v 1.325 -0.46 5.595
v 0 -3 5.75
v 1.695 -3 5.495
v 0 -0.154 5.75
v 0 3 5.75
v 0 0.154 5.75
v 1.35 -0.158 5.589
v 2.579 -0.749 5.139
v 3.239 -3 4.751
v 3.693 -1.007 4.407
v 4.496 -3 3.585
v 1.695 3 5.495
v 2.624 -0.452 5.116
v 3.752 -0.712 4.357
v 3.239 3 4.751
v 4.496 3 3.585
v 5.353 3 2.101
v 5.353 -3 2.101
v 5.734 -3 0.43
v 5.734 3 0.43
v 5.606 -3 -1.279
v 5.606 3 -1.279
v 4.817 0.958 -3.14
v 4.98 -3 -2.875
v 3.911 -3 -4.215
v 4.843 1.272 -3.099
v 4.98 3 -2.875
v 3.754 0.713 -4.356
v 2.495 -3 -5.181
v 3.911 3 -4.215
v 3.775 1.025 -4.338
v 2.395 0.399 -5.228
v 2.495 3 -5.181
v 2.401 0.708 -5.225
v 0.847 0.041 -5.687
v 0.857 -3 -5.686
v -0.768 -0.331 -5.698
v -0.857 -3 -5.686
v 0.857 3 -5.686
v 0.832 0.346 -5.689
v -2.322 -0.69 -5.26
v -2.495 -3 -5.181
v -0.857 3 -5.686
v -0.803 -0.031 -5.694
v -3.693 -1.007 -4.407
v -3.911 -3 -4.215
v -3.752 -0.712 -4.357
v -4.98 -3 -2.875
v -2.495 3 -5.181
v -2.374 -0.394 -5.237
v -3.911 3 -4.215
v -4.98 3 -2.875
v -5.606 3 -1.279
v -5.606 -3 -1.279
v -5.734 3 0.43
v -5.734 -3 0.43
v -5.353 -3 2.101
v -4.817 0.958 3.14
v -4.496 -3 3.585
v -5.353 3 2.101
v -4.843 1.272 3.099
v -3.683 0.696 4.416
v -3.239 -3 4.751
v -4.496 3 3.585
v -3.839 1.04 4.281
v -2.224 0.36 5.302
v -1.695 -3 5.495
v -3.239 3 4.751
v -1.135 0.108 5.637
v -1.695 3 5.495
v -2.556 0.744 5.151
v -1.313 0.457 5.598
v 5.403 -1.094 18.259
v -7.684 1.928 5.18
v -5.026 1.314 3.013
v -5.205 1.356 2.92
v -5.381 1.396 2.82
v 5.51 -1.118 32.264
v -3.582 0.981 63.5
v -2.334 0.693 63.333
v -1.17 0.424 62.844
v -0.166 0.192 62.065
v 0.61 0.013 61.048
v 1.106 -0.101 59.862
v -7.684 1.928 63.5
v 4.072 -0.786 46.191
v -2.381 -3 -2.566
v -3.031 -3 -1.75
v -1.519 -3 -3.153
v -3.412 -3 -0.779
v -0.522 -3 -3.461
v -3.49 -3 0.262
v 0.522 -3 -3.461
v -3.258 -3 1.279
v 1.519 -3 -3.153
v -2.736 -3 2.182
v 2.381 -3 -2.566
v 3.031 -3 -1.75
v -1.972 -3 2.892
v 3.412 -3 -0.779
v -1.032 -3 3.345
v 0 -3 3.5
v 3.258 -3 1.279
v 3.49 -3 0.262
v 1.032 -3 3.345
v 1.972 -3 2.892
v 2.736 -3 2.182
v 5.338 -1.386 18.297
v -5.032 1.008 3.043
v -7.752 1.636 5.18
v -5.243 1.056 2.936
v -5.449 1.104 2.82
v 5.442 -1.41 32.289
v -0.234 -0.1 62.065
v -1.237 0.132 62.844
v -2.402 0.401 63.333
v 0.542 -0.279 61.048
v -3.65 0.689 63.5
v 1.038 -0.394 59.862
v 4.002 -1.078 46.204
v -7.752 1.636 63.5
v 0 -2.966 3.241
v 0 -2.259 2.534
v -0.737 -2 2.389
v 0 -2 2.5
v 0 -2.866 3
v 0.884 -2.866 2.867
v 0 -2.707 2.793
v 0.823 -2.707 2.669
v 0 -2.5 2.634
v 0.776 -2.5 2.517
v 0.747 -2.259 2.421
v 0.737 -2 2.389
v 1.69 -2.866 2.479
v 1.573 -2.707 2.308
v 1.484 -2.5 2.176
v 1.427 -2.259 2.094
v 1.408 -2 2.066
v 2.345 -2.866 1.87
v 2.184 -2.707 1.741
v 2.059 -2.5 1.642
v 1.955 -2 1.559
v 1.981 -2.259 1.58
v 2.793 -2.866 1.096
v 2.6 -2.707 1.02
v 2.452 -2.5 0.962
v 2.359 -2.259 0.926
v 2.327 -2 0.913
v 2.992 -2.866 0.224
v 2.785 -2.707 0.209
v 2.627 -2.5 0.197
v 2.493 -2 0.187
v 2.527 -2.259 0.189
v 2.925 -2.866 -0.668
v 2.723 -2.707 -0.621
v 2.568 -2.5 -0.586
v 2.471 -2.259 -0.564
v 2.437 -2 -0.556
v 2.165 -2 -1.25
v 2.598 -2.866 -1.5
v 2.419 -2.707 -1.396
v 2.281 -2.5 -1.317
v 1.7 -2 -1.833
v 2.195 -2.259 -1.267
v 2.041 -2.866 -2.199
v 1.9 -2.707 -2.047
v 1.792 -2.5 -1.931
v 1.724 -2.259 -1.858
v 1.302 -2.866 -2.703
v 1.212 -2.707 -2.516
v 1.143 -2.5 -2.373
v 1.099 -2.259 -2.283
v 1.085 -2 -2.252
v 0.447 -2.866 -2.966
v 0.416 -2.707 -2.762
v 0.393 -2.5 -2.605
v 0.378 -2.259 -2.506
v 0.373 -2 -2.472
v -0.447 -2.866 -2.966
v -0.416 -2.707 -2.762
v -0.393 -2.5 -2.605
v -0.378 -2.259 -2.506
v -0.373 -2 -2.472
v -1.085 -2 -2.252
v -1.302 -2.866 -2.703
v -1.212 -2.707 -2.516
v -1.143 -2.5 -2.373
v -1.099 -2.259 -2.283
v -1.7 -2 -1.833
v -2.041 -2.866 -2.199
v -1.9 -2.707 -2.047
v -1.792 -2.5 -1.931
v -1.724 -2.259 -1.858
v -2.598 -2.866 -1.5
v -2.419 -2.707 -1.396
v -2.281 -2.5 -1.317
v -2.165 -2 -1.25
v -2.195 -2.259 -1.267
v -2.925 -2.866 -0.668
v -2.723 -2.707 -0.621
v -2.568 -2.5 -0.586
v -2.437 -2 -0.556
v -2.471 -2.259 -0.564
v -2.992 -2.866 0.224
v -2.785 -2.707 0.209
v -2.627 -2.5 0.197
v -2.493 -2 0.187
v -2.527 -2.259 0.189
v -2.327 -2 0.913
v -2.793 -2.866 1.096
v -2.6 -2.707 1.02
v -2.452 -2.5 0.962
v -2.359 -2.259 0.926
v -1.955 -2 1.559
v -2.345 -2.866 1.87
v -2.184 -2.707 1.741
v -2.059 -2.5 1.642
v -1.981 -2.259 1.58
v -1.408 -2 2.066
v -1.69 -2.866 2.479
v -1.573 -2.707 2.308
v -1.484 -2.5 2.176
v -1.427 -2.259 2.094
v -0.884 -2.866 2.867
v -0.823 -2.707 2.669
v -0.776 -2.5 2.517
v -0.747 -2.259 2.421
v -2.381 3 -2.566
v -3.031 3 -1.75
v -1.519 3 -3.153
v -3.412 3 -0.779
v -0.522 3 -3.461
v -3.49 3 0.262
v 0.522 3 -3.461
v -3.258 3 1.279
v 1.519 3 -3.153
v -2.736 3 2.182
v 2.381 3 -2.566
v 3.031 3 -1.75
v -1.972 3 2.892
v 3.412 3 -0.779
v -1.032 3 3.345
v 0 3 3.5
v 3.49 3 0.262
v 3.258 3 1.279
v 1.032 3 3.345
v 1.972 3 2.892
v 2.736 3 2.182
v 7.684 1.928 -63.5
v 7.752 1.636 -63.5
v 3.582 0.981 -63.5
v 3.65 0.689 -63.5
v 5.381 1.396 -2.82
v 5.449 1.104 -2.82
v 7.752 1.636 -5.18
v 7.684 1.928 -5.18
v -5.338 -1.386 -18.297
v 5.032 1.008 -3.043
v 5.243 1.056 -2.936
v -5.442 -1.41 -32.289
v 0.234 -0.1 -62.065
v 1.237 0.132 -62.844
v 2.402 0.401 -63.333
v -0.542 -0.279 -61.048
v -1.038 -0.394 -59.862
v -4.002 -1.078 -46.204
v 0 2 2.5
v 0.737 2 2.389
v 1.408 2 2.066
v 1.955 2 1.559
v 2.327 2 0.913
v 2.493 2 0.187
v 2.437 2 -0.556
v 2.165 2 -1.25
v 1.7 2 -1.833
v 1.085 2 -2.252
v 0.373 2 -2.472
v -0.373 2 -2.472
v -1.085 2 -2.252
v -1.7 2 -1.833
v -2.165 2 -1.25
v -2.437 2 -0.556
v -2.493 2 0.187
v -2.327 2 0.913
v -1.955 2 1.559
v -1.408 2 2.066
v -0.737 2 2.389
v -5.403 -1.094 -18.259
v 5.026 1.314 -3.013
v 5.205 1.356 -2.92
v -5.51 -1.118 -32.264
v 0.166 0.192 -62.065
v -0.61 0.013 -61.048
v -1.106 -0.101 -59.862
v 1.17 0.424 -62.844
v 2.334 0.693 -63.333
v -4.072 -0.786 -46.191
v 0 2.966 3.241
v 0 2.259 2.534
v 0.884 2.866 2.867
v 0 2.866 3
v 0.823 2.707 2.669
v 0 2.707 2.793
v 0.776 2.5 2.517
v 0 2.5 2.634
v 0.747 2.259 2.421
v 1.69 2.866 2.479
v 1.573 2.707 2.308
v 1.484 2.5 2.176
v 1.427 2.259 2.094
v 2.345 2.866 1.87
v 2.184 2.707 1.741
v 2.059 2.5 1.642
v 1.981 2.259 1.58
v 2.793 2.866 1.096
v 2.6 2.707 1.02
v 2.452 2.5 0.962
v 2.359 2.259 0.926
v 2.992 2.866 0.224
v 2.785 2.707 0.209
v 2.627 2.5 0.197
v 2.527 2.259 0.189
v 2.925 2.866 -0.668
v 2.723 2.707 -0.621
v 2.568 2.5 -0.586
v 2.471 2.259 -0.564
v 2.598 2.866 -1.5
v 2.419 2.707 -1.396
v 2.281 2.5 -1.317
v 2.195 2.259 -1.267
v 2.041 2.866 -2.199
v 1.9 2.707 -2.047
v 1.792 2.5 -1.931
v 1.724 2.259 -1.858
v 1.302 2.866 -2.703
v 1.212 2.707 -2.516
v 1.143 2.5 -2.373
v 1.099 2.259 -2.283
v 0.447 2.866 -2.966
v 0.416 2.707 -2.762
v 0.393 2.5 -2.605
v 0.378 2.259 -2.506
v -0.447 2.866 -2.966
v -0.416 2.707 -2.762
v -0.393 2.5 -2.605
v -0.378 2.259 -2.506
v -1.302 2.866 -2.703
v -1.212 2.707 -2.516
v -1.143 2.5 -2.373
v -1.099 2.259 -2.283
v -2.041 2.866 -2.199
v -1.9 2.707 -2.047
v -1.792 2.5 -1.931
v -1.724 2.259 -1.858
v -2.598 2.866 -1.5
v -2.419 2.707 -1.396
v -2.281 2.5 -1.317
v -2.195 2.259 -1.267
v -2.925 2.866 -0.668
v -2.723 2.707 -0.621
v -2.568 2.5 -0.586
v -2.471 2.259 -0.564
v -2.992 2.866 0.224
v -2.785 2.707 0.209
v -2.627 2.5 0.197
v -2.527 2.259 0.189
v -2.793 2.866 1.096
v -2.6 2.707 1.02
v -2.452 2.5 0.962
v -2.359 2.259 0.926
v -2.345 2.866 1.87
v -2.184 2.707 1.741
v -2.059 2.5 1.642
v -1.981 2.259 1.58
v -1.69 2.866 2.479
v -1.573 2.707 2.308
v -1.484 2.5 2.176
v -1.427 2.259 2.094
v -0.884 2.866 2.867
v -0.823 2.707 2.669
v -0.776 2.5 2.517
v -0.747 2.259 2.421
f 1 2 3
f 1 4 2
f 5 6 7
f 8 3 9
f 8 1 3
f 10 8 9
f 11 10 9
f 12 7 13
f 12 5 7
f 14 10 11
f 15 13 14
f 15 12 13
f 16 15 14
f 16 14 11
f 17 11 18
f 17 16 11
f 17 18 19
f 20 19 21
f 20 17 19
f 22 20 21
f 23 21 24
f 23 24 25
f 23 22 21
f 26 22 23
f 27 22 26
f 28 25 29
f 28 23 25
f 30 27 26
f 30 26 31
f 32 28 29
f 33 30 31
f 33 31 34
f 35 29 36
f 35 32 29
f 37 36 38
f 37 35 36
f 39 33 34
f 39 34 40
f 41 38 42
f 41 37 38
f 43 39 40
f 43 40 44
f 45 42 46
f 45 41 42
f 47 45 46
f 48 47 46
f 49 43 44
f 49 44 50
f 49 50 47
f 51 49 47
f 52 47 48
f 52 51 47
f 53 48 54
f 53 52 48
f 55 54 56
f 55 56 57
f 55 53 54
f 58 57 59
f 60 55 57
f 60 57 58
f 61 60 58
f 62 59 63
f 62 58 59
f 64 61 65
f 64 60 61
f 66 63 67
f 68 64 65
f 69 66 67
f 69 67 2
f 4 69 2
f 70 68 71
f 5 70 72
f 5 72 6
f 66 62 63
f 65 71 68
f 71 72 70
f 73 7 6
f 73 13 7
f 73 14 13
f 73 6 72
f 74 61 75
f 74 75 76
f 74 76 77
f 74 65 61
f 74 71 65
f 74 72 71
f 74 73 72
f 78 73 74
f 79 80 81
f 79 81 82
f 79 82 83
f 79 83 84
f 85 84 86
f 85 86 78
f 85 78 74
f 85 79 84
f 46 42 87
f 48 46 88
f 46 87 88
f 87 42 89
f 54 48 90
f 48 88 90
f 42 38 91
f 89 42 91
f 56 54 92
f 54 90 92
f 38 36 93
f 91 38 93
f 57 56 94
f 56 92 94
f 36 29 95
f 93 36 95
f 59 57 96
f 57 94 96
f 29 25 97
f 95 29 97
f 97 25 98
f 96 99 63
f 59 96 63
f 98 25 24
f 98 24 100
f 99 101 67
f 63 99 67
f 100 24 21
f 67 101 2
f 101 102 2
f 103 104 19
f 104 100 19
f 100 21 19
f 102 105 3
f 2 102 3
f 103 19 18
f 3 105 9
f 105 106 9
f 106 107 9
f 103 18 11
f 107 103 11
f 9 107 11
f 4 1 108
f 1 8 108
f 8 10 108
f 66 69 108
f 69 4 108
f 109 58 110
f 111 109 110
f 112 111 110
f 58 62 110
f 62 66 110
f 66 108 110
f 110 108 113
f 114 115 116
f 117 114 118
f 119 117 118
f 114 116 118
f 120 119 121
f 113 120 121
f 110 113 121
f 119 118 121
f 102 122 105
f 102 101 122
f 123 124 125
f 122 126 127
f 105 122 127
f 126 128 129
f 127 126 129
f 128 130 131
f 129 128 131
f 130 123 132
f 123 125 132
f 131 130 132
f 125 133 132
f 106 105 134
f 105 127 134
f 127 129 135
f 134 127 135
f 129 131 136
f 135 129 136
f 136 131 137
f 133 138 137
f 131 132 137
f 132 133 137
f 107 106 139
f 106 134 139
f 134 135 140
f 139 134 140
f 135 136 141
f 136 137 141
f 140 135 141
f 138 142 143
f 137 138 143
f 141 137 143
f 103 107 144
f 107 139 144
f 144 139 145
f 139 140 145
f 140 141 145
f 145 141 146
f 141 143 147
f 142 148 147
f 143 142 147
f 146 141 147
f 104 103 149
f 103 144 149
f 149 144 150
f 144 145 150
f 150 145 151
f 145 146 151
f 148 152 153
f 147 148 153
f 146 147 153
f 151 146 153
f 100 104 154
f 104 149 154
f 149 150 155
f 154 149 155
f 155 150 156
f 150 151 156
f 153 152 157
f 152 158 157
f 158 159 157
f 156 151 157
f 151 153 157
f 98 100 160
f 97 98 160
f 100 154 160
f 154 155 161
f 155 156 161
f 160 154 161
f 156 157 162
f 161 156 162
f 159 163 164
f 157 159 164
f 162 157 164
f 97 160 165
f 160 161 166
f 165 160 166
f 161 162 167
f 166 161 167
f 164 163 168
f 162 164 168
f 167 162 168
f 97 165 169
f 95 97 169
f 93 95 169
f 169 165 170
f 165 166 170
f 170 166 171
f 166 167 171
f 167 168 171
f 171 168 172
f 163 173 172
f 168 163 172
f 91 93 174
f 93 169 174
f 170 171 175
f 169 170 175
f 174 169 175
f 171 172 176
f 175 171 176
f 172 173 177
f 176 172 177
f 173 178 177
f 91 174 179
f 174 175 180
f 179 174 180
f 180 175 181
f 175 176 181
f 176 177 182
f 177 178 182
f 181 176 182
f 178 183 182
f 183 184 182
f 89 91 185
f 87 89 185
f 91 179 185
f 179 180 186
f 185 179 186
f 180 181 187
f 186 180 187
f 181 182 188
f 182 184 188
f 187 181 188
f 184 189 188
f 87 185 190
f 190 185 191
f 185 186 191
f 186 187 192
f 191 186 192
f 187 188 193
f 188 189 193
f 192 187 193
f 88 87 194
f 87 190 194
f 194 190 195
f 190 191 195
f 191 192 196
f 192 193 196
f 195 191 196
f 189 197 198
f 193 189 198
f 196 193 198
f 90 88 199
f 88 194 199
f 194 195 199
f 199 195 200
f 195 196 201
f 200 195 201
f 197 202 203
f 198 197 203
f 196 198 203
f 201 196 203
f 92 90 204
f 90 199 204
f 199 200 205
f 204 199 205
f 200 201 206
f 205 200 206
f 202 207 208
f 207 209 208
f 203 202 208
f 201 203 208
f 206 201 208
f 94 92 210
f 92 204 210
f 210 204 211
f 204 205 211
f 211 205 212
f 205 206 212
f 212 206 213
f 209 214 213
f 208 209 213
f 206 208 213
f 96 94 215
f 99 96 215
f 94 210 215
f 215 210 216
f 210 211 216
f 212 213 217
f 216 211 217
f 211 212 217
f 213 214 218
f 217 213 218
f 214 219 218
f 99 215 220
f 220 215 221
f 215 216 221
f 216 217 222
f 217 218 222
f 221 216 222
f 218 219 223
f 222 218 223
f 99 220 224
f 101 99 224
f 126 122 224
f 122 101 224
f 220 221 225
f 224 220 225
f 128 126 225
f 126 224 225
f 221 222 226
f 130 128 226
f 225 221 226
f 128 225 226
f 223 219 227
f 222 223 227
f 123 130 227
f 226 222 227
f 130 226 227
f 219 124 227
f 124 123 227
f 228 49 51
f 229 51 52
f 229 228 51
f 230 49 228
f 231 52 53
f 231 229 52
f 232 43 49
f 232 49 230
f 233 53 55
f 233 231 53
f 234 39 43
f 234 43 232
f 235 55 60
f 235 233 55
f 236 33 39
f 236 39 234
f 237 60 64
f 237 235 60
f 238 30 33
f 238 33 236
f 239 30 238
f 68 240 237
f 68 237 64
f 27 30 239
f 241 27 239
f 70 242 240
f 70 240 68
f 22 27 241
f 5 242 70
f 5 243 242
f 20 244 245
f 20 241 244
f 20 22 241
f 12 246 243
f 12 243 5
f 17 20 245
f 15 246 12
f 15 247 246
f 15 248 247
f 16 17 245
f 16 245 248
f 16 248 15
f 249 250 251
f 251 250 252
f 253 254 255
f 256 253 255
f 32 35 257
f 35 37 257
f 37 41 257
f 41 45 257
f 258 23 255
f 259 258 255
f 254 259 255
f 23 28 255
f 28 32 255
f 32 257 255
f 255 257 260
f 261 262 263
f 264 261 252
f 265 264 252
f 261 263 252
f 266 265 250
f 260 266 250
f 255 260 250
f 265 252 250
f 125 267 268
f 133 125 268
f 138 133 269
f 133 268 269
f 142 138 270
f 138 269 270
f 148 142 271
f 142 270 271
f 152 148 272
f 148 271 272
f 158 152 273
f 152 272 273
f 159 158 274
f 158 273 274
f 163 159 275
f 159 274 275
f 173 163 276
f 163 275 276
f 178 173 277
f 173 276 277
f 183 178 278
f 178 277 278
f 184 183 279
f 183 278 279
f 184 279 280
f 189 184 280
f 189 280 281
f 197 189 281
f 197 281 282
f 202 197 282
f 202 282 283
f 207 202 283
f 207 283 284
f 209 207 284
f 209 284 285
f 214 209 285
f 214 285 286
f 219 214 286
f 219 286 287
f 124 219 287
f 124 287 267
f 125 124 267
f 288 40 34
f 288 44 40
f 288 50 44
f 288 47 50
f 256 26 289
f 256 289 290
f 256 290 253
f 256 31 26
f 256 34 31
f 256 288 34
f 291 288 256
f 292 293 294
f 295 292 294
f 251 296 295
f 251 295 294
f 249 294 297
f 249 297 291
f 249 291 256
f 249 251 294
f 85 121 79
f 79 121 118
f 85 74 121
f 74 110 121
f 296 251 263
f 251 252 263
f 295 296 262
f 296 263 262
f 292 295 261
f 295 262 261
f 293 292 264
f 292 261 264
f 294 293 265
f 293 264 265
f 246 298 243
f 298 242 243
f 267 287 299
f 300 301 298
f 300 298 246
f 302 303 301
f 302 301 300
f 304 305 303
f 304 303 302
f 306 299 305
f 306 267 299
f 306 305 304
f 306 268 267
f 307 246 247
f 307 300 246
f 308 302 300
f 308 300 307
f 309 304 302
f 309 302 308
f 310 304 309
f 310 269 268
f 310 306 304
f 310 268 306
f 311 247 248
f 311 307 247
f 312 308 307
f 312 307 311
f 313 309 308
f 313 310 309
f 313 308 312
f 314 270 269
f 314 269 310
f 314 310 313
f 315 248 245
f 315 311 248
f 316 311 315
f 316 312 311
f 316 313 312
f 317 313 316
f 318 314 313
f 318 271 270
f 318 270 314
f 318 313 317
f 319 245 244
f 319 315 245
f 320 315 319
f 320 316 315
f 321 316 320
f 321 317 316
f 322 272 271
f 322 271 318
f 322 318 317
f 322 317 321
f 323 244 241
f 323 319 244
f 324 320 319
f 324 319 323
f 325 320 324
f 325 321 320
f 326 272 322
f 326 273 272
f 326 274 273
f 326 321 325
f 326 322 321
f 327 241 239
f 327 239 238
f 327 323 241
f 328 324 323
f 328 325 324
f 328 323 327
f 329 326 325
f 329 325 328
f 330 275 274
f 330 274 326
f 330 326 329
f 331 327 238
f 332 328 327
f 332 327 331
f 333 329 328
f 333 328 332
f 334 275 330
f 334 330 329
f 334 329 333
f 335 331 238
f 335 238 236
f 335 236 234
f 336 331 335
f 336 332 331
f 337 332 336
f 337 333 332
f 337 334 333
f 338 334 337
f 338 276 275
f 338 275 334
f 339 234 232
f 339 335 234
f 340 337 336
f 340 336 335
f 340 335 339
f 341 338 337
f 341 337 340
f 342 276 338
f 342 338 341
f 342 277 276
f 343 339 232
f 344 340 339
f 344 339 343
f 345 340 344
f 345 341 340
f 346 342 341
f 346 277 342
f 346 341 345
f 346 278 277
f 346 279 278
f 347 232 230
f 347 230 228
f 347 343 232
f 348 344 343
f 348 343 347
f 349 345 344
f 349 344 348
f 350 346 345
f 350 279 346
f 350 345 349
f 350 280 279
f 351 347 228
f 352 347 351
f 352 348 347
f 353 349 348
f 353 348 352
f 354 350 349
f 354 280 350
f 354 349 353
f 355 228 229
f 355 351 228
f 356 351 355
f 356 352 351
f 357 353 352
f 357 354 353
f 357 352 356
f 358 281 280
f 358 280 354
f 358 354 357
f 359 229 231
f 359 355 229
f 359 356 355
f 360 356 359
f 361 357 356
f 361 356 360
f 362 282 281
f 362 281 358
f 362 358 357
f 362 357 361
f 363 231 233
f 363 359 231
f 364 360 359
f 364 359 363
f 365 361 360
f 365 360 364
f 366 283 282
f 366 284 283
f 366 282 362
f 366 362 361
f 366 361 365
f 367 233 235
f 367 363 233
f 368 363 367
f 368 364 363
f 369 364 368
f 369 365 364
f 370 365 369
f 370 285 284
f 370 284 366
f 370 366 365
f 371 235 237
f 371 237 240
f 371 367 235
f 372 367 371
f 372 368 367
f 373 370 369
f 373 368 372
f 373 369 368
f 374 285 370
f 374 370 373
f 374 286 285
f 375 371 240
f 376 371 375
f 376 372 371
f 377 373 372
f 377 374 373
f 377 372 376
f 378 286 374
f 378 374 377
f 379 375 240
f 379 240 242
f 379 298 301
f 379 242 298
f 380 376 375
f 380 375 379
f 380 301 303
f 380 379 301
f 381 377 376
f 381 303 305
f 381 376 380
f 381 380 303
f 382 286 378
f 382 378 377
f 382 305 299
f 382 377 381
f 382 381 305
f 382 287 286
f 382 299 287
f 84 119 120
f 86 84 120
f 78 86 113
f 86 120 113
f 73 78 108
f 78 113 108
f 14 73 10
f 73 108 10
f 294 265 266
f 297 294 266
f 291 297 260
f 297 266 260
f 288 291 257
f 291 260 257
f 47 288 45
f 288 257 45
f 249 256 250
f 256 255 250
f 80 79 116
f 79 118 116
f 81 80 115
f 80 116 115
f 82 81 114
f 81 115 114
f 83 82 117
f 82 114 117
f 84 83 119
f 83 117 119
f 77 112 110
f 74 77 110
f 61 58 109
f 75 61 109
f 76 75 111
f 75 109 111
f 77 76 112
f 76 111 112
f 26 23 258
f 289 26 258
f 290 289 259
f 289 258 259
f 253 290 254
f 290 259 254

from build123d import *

# Parameters (mm, degrees)
SKETCH1_R           = 5.75
BOSS_EXTRUDE2_DEPTH = 3
BOSS_EXTRUDE3_DEPTH = 0.15
CIRPATTERN1_COUNT   = 2
SKETCH7_R           = 2.5
CUT_EXTRUDE1_DEPTH  = 65.252141201
FILLET1_R           = 1


with BuildPart() as part:
    # Sketch1 → Boss-Extrude2 (new, symmetric)
    with BuildSketch(Plane(origin=(0, 0, 0), x_dir=(1, 0, 0), z_dir=(0, 1, 0))):
        with Locations(Location((0, 0, 0), (0, 0, 270))):
            Circle(SKETCH1_R)
    extrude(amount=BOSS_EXTRUDE2_DEPTH, both=True)

    # Sketch6 → Boss-Extrude3 (add, symmetric)
    with BuildSketch(Plane(origin=(0, 0, 0), x_dir=(0.9743700647852352, -0.22495105434386534, 0), z_dir=(-0.2249510543438653, -0.9743700647852351, 0))):
        with BuildLine():
            Line((-5.557419516, 2.82), (-7.920891538, 5.18))
            Line((-7.920891538, 5.18), (-7.920891538, 63.5))
            Line((-7.920891538, 63.5), (-3.710891538, 63.5))
            ThreePointArc((-3.710891538, 63.5), (-0.694973133, 62.488011556), (1.100115443, 59.861694468))
            ThreePointArc((1.100115443, 59.861694468), (5.738056471, 28.958255312), (2.470780015, -2.12))
            ThreePointArc((2.470780015, -2.12), (-0.066255988, 2.750437774), (-5.557419516, 2.82))
        make_face()
    boss_extrude3 = extrude(amount=BOSS_EXTRUDE3_DEPTH, both=True)

    # CirPattern1: Boss-Extrude3 ×2 about axis
    cirpattern1_axis = Axis((0, 0, 0), (0, 1, 0))
    for i in range(1, CIRPATTERN1_COUNT):
        add(boss_extrude3.rotate(cirpattern1_axis, i * 360 / CIRPATTERN1_COUNT))

    # Sketch7 → Cut-Extrude1 (cut, through all)
    with BuildSketch(Plane(origin=(0, 3, 0), x_dir=(1, 0, 0), z_dir=(0, 1, 0))):
        with Locations(Location((0, 0, 0), (0, 0, 270))):
            Circle(SKETCH7_R)
    extrude(amount=-CUT_EXTRUDE1_DEPTH, mode=Mode.SUBTRACT)

    # Fillet1
    fillet1_edges = [part.edges().sort_by_distance(p)[0] for p in [
        (0, -3, -2.5),
        (0, 3, -2.5),
    ]]
    fillet(fillet1_edges, radius=FILLET1_R)


solid = part.part
